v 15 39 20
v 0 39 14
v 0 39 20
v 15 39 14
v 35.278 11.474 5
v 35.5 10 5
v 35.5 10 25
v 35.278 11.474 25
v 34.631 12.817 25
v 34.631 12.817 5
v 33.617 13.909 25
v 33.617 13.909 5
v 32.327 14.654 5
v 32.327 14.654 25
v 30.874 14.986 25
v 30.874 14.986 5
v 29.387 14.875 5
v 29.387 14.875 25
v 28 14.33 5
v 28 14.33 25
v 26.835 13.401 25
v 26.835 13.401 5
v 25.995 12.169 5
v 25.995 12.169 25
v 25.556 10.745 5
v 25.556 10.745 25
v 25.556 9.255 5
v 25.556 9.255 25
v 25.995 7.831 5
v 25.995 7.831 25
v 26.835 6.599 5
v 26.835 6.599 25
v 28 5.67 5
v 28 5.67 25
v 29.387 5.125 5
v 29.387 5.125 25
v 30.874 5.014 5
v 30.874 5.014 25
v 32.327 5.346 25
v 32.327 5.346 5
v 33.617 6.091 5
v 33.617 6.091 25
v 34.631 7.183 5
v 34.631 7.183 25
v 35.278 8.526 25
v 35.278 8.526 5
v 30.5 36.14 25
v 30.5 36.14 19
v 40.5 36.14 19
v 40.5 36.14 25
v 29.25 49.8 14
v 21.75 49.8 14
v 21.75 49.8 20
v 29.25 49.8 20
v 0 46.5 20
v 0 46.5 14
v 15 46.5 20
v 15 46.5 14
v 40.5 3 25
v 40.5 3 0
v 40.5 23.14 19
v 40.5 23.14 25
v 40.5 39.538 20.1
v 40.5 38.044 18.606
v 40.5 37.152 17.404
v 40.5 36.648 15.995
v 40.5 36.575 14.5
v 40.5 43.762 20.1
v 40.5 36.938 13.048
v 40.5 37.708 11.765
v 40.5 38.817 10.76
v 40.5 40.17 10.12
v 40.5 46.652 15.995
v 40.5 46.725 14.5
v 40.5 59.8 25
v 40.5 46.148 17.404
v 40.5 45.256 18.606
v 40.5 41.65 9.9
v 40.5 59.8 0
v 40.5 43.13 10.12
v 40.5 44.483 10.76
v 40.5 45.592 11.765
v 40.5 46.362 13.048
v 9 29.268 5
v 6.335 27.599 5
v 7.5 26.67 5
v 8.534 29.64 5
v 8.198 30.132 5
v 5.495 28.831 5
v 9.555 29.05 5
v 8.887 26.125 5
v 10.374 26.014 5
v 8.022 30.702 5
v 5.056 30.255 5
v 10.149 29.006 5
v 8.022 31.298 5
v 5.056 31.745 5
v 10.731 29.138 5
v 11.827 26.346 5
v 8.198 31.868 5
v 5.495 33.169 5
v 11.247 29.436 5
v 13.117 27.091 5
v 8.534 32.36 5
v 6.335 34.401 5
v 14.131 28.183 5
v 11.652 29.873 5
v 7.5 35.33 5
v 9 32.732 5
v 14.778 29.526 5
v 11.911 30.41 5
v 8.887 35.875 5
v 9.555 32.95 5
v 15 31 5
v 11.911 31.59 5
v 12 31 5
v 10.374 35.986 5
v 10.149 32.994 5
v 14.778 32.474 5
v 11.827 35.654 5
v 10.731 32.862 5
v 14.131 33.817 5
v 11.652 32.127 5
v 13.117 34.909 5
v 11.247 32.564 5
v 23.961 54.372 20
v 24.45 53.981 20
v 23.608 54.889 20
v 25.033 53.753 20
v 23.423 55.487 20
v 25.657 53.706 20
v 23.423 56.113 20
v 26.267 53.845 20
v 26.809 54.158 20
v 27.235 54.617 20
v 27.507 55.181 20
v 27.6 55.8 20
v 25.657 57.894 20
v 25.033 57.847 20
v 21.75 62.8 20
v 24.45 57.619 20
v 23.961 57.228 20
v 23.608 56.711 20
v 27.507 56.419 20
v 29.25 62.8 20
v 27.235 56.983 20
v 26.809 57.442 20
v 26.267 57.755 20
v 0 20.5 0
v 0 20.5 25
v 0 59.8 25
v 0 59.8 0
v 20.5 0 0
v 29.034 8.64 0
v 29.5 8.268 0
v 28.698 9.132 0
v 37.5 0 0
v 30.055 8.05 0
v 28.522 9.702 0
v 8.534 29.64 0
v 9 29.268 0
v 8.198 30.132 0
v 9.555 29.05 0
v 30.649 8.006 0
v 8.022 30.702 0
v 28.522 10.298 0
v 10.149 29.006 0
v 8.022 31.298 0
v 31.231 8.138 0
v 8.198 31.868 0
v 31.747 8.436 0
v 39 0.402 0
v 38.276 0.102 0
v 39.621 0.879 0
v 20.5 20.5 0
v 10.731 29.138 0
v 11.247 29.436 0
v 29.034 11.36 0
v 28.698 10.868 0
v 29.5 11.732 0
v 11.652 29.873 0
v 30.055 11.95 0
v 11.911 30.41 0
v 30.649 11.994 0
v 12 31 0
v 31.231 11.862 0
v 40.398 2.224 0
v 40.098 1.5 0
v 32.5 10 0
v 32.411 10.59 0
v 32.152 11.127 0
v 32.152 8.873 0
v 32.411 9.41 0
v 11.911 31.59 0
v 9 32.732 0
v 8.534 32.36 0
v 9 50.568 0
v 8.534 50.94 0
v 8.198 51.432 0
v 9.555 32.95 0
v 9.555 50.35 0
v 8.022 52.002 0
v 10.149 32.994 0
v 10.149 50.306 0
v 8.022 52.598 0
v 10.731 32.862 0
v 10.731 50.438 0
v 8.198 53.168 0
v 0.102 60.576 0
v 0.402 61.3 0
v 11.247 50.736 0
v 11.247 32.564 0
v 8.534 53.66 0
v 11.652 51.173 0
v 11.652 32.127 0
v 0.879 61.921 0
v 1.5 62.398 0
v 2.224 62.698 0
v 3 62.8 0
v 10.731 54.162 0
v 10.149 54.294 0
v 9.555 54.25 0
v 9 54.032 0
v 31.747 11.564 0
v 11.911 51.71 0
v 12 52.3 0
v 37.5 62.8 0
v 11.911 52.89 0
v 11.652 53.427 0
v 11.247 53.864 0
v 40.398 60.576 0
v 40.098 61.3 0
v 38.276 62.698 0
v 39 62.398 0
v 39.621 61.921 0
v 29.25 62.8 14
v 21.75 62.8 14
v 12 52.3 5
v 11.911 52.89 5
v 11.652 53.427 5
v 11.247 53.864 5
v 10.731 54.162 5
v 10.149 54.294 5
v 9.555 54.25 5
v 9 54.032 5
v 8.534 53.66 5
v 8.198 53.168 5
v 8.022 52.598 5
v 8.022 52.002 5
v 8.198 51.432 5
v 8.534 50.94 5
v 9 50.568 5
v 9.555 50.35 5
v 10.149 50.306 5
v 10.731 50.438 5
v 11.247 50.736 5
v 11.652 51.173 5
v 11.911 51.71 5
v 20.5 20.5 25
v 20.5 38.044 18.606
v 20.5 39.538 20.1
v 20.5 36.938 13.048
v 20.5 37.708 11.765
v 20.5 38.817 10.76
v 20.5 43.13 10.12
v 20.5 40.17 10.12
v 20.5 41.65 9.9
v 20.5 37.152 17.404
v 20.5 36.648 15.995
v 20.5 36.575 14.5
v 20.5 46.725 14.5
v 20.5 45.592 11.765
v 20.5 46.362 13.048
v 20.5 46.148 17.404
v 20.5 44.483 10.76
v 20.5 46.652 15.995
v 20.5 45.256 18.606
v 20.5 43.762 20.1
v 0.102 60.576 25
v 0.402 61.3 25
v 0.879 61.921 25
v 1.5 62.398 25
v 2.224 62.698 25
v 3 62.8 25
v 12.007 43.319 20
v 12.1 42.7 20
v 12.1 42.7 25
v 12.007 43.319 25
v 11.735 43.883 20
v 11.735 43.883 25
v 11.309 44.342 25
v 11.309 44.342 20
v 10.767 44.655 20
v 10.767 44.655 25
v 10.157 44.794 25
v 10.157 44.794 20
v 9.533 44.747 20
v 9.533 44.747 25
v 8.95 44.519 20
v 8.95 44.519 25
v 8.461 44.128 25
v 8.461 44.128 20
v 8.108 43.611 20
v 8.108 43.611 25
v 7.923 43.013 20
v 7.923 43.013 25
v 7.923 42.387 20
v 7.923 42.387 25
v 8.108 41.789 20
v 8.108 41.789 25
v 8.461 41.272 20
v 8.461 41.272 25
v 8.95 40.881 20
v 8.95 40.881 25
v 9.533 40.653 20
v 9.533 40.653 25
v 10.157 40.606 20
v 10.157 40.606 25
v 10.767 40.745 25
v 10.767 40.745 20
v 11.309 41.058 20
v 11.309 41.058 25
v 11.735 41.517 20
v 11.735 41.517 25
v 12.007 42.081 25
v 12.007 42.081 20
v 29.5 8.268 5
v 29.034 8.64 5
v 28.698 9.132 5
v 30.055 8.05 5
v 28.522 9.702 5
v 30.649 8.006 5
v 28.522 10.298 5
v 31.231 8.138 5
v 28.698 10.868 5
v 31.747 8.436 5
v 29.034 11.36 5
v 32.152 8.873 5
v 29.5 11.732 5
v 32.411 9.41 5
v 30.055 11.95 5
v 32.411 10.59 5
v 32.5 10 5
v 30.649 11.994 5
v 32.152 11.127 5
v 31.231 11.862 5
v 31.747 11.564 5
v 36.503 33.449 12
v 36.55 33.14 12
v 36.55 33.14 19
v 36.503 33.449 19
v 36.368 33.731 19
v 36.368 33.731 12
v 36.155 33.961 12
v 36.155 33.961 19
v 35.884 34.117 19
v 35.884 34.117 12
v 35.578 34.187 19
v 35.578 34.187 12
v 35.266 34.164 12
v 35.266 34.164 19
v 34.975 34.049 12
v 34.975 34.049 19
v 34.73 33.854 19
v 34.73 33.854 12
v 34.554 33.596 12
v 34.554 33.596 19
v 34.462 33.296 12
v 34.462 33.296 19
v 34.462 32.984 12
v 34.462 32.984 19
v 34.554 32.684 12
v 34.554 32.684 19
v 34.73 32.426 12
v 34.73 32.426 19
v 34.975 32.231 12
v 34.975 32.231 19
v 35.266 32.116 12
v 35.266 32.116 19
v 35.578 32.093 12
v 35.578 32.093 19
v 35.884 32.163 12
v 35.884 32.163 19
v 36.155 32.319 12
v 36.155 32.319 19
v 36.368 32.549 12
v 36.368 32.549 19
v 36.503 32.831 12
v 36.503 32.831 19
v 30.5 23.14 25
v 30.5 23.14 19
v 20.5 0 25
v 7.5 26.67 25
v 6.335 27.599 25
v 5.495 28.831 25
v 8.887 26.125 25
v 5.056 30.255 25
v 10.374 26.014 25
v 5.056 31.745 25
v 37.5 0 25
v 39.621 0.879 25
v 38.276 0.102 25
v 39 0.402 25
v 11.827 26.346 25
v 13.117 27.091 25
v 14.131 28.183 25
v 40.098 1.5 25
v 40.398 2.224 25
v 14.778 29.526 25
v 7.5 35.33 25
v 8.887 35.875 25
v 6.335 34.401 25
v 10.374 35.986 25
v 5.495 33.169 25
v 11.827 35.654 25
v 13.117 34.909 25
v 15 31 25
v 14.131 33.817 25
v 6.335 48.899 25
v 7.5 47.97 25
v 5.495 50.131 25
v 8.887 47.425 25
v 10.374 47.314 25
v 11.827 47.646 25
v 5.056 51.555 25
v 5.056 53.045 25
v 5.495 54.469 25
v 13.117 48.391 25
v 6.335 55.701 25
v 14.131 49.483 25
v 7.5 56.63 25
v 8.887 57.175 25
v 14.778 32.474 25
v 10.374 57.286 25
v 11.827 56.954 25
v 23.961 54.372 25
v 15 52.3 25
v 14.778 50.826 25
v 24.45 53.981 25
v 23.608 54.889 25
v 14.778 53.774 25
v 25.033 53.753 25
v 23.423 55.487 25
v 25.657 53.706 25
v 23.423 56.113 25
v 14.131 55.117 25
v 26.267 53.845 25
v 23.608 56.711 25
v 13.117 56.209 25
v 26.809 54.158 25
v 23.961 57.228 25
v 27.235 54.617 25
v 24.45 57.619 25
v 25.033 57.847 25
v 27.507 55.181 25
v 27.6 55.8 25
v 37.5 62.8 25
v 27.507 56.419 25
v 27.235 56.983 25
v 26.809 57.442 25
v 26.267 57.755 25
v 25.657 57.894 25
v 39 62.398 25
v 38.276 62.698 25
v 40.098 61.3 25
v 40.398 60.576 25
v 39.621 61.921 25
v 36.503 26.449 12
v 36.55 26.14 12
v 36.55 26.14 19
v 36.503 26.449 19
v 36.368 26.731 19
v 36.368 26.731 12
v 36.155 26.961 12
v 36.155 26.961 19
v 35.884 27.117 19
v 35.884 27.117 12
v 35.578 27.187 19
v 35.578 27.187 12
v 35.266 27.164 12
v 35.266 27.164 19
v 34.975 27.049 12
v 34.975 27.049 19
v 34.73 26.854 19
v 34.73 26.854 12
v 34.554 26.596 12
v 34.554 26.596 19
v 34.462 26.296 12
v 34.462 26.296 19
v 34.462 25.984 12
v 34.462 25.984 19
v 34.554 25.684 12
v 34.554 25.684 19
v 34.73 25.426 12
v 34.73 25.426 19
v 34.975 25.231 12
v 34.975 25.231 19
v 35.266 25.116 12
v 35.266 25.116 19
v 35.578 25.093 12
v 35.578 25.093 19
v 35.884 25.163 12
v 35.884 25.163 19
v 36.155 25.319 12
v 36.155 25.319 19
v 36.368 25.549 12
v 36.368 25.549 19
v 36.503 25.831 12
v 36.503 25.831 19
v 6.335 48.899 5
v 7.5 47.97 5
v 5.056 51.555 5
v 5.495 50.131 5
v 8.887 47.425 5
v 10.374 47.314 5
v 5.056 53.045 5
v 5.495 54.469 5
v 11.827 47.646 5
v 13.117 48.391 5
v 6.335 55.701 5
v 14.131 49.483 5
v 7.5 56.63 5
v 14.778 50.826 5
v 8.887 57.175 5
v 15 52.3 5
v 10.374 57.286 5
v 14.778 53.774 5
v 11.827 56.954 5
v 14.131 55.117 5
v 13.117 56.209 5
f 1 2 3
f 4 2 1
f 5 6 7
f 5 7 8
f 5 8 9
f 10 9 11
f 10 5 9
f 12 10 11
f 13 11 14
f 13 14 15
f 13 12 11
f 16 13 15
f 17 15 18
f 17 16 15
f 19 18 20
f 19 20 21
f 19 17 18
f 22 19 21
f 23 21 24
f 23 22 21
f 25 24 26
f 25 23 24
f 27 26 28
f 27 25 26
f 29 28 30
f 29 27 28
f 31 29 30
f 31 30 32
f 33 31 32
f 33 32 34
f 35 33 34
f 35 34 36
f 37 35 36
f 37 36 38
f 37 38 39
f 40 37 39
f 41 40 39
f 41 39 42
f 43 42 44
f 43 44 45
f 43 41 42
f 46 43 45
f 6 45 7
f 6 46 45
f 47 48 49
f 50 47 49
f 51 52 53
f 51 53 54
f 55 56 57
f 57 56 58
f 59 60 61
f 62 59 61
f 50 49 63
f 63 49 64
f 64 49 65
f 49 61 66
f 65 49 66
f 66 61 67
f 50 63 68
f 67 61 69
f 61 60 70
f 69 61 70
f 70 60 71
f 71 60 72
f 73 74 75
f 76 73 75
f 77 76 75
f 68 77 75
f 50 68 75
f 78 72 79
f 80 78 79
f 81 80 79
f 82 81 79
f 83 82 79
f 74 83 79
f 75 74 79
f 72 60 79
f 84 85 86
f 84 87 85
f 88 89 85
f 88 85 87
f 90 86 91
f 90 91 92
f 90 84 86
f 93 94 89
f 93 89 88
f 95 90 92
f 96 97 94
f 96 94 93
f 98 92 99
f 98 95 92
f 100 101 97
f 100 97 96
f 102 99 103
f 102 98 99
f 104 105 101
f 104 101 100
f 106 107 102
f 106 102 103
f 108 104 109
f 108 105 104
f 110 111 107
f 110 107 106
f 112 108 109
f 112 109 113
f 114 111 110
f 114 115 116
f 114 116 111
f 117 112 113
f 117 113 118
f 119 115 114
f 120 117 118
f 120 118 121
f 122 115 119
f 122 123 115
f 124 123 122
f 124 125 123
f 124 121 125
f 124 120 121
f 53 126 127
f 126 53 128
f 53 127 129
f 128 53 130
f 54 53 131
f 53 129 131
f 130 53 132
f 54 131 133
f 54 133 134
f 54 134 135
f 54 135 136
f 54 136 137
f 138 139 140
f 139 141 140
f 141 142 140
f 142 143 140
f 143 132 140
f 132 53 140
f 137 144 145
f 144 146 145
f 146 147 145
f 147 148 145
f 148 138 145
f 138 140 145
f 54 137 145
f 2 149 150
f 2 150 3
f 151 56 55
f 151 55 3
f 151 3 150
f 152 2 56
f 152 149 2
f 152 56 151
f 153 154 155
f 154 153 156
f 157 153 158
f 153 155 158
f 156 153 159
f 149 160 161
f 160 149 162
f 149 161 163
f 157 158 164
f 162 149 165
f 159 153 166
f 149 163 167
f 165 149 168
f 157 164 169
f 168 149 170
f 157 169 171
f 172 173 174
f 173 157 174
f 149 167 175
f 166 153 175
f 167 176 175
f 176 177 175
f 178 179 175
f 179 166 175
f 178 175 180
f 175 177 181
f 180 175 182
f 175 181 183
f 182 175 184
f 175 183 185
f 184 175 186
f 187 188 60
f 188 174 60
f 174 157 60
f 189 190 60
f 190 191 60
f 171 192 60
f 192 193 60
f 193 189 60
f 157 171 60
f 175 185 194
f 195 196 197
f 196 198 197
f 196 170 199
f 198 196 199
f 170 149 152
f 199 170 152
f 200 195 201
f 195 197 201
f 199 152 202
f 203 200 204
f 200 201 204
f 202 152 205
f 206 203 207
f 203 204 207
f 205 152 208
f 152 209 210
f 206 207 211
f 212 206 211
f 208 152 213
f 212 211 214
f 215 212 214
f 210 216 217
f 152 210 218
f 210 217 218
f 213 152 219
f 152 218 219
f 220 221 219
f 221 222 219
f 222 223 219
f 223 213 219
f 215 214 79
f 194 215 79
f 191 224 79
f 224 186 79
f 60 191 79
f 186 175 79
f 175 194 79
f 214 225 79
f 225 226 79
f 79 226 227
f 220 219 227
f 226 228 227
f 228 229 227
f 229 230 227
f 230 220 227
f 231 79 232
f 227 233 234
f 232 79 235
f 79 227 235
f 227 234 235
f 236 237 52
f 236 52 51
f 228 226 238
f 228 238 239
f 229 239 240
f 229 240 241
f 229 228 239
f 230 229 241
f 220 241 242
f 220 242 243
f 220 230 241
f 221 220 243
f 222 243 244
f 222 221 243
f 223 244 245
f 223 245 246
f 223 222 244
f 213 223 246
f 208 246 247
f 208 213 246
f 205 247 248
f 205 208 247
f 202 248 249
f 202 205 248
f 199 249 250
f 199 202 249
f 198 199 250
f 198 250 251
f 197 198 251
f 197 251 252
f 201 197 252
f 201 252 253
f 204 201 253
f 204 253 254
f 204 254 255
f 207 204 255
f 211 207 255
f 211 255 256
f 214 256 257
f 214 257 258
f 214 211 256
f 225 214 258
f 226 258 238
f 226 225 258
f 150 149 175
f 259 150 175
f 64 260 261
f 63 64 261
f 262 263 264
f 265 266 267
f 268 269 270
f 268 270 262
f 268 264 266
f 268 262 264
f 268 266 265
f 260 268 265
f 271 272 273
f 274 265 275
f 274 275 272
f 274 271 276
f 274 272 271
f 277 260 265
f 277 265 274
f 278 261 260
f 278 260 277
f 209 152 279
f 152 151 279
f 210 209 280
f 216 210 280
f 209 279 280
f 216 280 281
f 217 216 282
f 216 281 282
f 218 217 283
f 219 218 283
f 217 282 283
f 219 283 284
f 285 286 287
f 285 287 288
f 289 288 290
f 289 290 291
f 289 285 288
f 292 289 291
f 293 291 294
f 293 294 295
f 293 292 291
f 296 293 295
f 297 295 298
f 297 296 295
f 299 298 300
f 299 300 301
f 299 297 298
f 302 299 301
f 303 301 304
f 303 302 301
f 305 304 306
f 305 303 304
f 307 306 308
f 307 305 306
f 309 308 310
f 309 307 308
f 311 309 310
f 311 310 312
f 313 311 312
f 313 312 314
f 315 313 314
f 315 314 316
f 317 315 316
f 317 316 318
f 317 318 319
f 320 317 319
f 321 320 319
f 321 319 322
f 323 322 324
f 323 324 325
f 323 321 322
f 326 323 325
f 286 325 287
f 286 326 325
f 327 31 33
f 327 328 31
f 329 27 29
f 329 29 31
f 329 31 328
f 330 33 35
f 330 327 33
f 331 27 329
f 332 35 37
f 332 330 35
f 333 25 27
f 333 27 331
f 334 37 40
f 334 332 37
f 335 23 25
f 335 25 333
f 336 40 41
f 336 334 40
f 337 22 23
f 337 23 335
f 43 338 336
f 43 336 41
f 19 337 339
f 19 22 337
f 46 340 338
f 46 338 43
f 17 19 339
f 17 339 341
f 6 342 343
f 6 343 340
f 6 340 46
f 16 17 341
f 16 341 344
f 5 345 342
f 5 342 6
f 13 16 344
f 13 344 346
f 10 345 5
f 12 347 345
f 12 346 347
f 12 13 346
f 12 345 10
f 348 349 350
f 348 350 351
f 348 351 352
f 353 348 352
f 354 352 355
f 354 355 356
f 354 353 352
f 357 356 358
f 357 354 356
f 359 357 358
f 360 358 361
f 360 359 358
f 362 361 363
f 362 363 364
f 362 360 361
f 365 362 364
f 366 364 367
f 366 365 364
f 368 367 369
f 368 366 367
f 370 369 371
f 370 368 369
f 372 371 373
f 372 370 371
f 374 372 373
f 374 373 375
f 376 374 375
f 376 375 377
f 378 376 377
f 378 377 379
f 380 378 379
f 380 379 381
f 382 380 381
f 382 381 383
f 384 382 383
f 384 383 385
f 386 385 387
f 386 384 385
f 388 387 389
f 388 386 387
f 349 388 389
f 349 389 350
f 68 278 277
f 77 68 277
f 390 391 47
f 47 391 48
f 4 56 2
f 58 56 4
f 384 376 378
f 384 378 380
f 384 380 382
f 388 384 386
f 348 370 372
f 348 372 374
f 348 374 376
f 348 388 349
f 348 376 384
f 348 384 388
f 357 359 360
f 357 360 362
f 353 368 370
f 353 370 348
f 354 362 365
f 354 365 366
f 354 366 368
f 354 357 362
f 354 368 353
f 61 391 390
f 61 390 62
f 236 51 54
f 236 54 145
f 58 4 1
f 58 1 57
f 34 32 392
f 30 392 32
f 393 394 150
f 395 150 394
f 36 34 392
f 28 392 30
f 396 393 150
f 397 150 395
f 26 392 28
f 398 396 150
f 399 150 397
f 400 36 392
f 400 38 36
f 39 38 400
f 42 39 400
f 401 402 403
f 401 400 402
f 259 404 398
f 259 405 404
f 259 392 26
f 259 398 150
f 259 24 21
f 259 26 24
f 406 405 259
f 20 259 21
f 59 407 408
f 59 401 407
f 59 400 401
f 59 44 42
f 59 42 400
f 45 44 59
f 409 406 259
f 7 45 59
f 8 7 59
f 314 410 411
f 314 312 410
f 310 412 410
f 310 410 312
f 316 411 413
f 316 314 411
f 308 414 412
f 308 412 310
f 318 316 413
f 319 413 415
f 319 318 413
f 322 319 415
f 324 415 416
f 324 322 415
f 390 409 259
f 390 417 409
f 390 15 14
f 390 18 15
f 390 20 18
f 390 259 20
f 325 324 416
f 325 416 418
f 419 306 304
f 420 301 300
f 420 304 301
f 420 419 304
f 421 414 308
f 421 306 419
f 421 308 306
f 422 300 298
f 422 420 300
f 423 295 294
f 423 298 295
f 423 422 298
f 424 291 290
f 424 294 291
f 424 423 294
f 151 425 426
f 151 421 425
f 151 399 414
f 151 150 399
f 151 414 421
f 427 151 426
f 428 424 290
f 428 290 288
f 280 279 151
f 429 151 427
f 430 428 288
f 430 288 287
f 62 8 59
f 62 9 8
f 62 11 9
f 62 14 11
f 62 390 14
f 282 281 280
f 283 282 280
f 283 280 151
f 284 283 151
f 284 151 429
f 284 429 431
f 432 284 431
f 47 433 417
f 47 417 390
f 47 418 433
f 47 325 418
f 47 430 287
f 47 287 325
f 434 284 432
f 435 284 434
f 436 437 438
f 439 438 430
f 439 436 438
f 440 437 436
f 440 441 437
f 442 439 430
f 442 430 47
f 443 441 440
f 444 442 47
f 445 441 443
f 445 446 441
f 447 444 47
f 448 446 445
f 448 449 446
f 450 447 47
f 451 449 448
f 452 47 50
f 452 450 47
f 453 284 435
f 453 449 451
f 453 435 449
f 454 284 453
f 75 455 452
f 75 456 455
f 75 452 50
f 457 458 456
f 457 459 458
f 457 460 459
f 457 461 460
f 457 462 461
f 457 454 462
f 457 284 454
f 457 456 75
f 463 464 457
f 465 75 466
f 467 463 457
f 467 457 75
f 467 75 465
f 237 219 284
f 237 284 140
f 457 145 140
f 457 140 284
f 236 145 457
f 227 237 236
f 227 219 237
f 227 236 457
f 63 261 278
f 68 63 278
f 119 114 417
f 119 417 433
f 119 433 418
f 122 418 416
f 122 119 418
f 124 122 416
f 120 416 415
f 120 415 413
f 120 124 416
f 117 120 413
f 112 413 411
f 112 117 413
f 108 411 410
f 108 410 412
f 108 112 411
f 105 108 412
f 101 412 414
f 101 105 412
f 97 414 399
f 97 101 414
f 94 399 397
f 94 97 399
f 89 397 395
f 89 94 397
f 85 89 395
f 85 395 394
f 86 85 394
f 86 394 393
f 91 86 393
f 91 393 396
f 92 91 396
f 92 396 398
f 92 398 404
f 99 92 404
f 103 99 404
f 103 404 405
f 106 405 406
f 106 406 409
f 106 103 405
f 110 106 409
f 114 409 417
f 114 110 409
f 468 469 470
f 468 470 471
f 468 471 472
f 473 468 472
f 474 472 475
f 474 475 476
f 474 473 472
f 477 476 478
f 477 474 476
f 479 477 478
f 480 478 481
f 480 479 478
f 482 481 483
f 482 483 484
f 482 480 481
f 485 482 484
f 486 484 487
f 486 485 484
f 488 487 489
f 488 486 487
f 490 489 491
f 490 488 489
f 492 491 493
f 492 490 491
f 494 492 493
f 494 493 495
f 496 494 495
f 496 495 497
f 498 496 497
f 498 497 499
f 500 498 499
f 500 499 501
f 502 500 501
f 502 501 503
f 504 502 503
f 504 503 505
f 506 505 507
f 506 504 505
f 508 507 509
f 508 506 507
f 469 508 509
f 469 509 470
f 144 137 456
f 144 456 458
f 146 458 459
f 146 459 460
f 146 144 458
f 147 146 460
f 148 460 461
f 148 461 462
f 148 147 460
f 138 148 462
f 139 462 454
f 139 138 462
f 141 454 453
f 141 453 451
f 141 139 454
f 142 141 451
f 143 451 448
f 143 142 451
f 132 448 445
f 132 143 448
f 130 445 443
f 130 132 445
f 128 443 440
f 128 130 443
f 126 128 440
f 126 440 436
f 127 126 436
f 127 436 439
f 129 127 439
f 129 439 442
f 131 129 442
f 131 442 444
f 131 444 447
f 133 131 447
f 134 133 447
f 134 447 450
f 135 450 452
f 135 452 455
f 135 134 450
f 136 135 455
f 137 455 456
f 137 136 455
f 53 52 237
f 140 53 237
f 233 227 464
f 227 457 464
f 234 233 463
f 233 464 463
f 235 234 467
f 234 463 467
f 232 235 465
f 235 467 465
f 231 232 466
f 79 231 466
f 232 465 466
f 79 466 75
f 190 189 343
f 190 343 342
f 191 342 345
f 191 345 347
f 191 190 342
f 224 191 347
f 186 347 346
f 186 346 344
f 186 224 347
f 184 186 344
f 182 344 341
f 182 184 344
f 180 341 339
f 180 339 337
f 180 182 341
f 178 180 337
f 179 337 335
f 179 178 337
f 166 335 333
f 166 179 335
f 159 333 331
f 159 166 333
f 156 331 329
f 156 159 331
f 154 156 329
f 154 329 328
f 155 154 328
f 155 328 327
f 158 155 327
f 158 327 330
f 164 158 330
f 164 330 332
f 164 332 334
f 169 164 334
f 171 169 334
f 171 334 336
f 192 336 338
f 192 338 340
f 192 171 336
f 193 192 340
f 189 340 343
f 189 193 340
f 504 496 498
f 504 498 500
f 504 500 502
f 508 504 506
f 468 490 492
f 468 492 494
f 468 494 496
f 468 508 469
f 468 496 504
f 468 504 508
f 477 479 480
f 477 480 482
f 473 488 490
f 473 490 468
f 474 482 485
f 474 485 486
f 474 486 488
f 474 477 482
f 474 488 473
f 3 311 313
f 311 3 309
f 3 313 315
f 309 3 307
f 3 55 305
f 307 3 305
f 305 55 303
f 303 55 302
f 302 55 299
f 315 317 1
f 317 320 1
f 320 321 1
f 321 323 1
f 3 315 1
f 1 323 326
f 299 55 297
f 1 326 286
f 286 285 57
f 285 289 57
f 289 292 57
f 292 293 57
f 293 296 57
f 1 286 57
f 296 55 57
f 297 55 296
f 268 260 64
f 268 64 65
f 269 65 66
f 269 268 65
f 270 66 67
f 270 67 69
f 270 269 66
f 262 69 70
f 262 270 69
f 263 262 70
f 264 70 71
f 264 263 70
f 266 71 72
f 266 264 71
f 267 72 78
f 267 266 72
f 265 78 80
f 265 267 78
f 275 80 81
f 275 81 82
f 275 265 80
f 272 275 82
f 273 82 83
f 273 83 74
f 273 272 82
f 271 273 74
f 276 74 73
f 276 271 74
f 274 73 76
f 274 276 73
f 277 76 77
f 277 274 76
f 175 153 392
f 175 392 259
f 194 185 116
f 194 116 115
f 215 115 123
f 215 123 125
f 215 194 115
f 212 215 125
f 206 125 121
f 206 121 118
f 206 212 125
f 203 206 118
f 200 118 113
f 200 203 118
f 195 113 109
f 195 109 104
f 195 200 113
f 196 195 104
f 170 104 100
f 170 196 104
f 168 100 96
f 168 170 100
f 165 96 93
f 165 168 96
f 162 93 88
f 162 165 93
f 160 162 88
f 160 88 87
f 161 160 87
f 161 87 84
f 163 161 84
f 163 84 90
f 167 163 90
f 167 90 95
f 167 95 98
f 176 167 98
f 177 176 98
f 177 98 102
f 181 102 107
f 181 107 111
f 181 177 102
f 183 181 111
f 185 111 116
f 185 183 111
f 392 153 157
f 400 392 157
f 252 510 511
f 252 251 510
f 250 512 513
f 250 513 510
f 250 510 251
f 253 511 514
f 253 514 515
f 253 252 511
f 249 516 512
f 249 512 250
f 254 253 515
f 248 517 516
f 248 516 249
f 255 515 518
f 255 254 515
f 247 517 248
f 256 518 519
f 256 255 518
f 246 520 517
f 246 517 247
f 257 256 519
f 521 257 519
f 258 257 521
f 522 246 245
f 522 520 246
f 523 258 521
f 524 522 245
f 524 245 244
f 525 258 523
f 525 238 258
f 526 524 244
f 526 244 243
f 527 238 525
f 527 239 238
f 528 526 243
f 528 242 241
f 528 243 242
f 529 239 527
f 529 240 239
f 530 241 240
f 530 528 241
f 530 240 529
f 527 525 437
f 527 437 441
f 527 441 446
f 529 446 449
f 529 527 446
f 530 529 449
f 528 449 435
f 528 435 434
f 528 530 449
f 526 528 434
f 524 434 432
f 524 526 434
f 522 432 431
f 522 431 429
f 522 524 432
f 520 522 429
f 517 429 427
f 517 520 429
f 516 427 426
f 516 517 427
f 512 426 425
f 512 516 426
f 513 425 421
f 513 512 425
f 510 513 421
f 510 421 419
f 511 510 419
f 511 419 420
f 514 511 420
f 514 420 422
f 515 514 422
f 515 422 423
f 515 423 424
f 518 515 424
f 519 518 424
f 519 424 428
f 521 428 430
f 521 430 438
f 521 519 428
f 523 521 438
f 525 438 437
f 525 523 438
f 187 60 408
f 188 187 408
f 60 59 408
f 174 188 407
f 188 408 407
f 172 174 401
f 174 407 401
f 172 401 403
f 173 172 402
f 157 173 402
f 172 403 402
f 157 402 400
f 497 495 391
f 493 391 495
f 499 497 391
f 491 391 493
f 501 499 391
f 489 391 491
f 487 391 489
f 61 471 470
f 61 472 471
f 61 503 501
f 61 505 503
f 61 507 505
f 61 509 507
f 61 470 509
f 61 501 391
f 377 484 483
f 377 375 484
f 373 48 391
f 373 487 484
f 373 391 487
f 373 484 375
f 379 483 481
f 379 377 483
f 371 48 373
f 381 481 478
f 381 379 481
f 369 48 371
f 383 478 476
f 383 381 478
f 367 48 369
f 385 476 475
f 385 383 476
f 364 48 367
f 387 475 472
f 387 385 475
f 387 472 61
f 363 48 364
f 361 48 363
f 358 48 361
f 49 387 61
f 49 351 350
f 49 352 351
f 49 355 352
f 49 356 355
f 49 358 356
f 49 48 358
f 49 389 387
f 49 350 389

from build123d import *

# Parameters (mm, degrees)
EXTRUDE_DEPTH     = 20
BOX003_W          = 15
BOX003_H          = 7.5
BOX003_DEPTH      = 6
CYLINDER003_R     = 2.1
CYLINDER003_DEPTH = 5
CYLINDER002_R     = 1.05
CYLINDER002_DEPTH = 7
BOX002_W          = 10
BOX002_H          = 13
BOX002_DEPTH      = 6
CYLINDER001_R     = 2
CYLINDER001_DEPTH = 5
CYLINDER_R        = 5
CYLINDER_DEPTH    = 20
BOX001_W          = 20.5
BOX001_H          = 20.5
BOX001_DEPTH      = 25
BOX004_W          = 7.5
BOX004_H          = 13
BOX004_DEPTH      = 6
BOX_W             = 40.5
BOX_H             = 62.8
BOX_DEPTH         = 25
FILLET_R          = 3


with BuildPart() as m10_repraphole_extrud:
    # Sketch → Extrude (new body)
    with BuildSketch(Plane.YZ):
        with BuildLine():
            ThreePointArc((-3.606243, 3.606246), (0, -5.1), (3.606243, 3.606246))
            Line((2.112489, 5.1), (3.606243, 3.606246))
            Line((-2.112489, 5.1), (2.112489, 5.1))
            Line((-3.606243, 3.606246), (-2.112489, 5.1))
        make_face()
    extrude(amount=EXTRUDE_DEPTH)


with BuildPart() as m10_repraphole_extrud_1:
    # Extrude placement: moved
    add(m10_repraphole_extrud.part.moved(Location((20.5, 41.65, 15))))


with BuildPart() as hueco_taladro4:
    # Box003 → Box003 (new body)
    with BuildSketch(Plane(origin=(0, 39, 14), x_dir=(1, 0, 0), z_dir=(0, 0, 1))):
        with Locations((7.5, 3.75)):
            Rectangle(BOX003_W, BOX003_H)
    extrude(amount=BOX003_DEPTH)


with BuildPart() as taladro4:
    # Cylinder003 → Cylinder003 (new body)
    with BuildSketch(Plane(origin=(10, 42.7, 20), x_dir=(1, 0, 0), z_dir=(0, 0, 1))):
        Circle(CYLINDER003_R)
    extrude(amount=CYLINDER003_DEPTH)


with BuildPart() as clone005:
    # Clone005 base: copy of taladro4
    add(taladro4.part)


with BuildPart() as clone005_1:
    # Clone005 placement: moved
    add(clone005.part.moved(Location((15.5, 13.1, 0))))


with BuildPart() as taladro_endstop:
    # Cylinder002 → Cylinder002 (new body)
    with BuildSketch(Plane(origin=(35.5, 26.14, 12), x_dir=(1, 0, 0), z_dir=(0, 0, 1))):
        Circle(CYLINDER002_R)
    extrude(amount=CYLINDER002_DEPTH)


with BuildPart() as clone004:
    # Clone004 base: copy of taladro_endstop
    add(taladro_endstop.part)


with BuildPart() as clone004_1:
    # Clone004 placement: moved
    add(clone004.part.moved(Location((0, 7, 0))))


with BuildPart() as hueco_endstop:
    # Box002 → Box002 (new body)
    with BuildSketch(Plane(origin=(30.5, 23.14, 19), x_dir=(1, 0, 0), z_dir=(0, 0, 1))):
        with Locations((5, 6.5)):
            Rectangle(BOX002_W, BOX002_H)
    extrude(amount=BOX002_DEPTH)


with BuildPart() as taladro5:
    # Cylinder001 → Cylinder001 (new body)
    with BuildSketch(Plane(origin=(30.5, 10, 0), x_dir=(1, 0, 0), z_dir=(0, 0, 1))):
        Circle(CYLINDER001_R)
    extrude(amount=CYLINDER001_DEPTH)


with BuildPart() as clone002:
    # Clone002 base: copy of taladro5
    add(taladro5.part)


with BuildPart() as clone002_1:
    # Clone002 placement: moved
    add(clone002.part.moved(Location((-20.5, 21, 0))))


with BuildPart() as clone003:
    # Clone003 base: copy of Clone002
    add(clone002_1.part)


with BuildPart() as clone003_1:
    # Clone003 placement: moved
    add(clone003.part.moved(Location((0, 21.3, 0))))


with BuildPart() as taladro10:
    # Cylinder → Cylinder (new body)
    with BuildSketch(Plane(origin=(30.5, 10, 5), x_dir=(1, 0, 0), z_dir=(0, 0, 1))):
        Circle(CYLINDER_R)
    extrude(amount=CYLINDER_DEPTH)


with BuildPart() as clone:
    # Clone base: copy of taladro10
    add(taladro10.part)


with BuildPart() as clone_1:
    # Clone placement: moved
    add(clone.part.moved(Location((-20.5, 21, 0))))


with BuildPart() as clone001:
    # Clone001 base: copy of Clone
    add(clone_1.part)


with BuildPart() as clone001_1:
    # Clone001 placement: moved
    add(clone001.part.moved(Location((0, 21.3, 0))))


with BuildPart() as hueco_ejez:
    # Box001 → Box001 (new body)
    with BuildSketch(Plane.XY):
        with Locations((10.25, 10.25)):
            Rectangle(BOX001_W, BOX001_H)
    extrude(amount=BOX001_DEPTH)


with BuildPart() as huecos:
    # Box004 → Box004 (new body)
    with BuildSketch(Plane(origin=(21.75, 49.8, 14), x_dir=(1, 0, 0), z_dir=(0, 0, 1))):
        with Locations((3.75, 6.5)):
            Rectangle(BOX004_W, BOX004_H)
    extrude(amount=BOX004_DEPTH)

    # Fusion: union hueco_taladro4, Clone005, taladro4, Clone004, taladro_endstop, hueco_endstop, Clone003, Clone002, taladro5, Clone001, Clone, taladro10, hueco_ejez
    add(hueco_taladro4.part)
    add(clone005_1.part)
    add(taladro4.part)
    add(clone004_1.part)
    add(taladro_endstop.part)
    add(hueco_endstop.part)
    add(clone003_1.part)
    add(clone002_1.part)
    add(taladro5.part)
    add(clone001_1.part)
    add(clone_1.part)
    add(taladro10.part)
    add(hueco_ejez.part)


with BuildPart() as yidler_right_fileteado:
    # Box → Box (new body)
    with BuildSketch(Plane.XY):
        with Locations((20.25, 31.4)):
            Rectangle(BOX_W, BOX_H)
    extrude(amount=BOX_DEPTH)

    # Cut: cut huecos
    add(huecos.part, mode=Mode.SUBTRACT)

    # Cut001: cut M10_repraphole_extrud
    add(m10_repraphole_extrud_1.part, mode=Mode.SUBTRACT)

    # Fillet
    fillet_edges = [yidler_right_fileteado.edges().sort_by_distance(p)[0] for p in [
        (0, 62.8, 12.5),
        (40.5, 62.8, 12.5),
        (40.5, 0, 12.5),
    ]]
    fillet(fillet_edges, radius=FILLET_R)


solid = yidler_right_fileteado.part
